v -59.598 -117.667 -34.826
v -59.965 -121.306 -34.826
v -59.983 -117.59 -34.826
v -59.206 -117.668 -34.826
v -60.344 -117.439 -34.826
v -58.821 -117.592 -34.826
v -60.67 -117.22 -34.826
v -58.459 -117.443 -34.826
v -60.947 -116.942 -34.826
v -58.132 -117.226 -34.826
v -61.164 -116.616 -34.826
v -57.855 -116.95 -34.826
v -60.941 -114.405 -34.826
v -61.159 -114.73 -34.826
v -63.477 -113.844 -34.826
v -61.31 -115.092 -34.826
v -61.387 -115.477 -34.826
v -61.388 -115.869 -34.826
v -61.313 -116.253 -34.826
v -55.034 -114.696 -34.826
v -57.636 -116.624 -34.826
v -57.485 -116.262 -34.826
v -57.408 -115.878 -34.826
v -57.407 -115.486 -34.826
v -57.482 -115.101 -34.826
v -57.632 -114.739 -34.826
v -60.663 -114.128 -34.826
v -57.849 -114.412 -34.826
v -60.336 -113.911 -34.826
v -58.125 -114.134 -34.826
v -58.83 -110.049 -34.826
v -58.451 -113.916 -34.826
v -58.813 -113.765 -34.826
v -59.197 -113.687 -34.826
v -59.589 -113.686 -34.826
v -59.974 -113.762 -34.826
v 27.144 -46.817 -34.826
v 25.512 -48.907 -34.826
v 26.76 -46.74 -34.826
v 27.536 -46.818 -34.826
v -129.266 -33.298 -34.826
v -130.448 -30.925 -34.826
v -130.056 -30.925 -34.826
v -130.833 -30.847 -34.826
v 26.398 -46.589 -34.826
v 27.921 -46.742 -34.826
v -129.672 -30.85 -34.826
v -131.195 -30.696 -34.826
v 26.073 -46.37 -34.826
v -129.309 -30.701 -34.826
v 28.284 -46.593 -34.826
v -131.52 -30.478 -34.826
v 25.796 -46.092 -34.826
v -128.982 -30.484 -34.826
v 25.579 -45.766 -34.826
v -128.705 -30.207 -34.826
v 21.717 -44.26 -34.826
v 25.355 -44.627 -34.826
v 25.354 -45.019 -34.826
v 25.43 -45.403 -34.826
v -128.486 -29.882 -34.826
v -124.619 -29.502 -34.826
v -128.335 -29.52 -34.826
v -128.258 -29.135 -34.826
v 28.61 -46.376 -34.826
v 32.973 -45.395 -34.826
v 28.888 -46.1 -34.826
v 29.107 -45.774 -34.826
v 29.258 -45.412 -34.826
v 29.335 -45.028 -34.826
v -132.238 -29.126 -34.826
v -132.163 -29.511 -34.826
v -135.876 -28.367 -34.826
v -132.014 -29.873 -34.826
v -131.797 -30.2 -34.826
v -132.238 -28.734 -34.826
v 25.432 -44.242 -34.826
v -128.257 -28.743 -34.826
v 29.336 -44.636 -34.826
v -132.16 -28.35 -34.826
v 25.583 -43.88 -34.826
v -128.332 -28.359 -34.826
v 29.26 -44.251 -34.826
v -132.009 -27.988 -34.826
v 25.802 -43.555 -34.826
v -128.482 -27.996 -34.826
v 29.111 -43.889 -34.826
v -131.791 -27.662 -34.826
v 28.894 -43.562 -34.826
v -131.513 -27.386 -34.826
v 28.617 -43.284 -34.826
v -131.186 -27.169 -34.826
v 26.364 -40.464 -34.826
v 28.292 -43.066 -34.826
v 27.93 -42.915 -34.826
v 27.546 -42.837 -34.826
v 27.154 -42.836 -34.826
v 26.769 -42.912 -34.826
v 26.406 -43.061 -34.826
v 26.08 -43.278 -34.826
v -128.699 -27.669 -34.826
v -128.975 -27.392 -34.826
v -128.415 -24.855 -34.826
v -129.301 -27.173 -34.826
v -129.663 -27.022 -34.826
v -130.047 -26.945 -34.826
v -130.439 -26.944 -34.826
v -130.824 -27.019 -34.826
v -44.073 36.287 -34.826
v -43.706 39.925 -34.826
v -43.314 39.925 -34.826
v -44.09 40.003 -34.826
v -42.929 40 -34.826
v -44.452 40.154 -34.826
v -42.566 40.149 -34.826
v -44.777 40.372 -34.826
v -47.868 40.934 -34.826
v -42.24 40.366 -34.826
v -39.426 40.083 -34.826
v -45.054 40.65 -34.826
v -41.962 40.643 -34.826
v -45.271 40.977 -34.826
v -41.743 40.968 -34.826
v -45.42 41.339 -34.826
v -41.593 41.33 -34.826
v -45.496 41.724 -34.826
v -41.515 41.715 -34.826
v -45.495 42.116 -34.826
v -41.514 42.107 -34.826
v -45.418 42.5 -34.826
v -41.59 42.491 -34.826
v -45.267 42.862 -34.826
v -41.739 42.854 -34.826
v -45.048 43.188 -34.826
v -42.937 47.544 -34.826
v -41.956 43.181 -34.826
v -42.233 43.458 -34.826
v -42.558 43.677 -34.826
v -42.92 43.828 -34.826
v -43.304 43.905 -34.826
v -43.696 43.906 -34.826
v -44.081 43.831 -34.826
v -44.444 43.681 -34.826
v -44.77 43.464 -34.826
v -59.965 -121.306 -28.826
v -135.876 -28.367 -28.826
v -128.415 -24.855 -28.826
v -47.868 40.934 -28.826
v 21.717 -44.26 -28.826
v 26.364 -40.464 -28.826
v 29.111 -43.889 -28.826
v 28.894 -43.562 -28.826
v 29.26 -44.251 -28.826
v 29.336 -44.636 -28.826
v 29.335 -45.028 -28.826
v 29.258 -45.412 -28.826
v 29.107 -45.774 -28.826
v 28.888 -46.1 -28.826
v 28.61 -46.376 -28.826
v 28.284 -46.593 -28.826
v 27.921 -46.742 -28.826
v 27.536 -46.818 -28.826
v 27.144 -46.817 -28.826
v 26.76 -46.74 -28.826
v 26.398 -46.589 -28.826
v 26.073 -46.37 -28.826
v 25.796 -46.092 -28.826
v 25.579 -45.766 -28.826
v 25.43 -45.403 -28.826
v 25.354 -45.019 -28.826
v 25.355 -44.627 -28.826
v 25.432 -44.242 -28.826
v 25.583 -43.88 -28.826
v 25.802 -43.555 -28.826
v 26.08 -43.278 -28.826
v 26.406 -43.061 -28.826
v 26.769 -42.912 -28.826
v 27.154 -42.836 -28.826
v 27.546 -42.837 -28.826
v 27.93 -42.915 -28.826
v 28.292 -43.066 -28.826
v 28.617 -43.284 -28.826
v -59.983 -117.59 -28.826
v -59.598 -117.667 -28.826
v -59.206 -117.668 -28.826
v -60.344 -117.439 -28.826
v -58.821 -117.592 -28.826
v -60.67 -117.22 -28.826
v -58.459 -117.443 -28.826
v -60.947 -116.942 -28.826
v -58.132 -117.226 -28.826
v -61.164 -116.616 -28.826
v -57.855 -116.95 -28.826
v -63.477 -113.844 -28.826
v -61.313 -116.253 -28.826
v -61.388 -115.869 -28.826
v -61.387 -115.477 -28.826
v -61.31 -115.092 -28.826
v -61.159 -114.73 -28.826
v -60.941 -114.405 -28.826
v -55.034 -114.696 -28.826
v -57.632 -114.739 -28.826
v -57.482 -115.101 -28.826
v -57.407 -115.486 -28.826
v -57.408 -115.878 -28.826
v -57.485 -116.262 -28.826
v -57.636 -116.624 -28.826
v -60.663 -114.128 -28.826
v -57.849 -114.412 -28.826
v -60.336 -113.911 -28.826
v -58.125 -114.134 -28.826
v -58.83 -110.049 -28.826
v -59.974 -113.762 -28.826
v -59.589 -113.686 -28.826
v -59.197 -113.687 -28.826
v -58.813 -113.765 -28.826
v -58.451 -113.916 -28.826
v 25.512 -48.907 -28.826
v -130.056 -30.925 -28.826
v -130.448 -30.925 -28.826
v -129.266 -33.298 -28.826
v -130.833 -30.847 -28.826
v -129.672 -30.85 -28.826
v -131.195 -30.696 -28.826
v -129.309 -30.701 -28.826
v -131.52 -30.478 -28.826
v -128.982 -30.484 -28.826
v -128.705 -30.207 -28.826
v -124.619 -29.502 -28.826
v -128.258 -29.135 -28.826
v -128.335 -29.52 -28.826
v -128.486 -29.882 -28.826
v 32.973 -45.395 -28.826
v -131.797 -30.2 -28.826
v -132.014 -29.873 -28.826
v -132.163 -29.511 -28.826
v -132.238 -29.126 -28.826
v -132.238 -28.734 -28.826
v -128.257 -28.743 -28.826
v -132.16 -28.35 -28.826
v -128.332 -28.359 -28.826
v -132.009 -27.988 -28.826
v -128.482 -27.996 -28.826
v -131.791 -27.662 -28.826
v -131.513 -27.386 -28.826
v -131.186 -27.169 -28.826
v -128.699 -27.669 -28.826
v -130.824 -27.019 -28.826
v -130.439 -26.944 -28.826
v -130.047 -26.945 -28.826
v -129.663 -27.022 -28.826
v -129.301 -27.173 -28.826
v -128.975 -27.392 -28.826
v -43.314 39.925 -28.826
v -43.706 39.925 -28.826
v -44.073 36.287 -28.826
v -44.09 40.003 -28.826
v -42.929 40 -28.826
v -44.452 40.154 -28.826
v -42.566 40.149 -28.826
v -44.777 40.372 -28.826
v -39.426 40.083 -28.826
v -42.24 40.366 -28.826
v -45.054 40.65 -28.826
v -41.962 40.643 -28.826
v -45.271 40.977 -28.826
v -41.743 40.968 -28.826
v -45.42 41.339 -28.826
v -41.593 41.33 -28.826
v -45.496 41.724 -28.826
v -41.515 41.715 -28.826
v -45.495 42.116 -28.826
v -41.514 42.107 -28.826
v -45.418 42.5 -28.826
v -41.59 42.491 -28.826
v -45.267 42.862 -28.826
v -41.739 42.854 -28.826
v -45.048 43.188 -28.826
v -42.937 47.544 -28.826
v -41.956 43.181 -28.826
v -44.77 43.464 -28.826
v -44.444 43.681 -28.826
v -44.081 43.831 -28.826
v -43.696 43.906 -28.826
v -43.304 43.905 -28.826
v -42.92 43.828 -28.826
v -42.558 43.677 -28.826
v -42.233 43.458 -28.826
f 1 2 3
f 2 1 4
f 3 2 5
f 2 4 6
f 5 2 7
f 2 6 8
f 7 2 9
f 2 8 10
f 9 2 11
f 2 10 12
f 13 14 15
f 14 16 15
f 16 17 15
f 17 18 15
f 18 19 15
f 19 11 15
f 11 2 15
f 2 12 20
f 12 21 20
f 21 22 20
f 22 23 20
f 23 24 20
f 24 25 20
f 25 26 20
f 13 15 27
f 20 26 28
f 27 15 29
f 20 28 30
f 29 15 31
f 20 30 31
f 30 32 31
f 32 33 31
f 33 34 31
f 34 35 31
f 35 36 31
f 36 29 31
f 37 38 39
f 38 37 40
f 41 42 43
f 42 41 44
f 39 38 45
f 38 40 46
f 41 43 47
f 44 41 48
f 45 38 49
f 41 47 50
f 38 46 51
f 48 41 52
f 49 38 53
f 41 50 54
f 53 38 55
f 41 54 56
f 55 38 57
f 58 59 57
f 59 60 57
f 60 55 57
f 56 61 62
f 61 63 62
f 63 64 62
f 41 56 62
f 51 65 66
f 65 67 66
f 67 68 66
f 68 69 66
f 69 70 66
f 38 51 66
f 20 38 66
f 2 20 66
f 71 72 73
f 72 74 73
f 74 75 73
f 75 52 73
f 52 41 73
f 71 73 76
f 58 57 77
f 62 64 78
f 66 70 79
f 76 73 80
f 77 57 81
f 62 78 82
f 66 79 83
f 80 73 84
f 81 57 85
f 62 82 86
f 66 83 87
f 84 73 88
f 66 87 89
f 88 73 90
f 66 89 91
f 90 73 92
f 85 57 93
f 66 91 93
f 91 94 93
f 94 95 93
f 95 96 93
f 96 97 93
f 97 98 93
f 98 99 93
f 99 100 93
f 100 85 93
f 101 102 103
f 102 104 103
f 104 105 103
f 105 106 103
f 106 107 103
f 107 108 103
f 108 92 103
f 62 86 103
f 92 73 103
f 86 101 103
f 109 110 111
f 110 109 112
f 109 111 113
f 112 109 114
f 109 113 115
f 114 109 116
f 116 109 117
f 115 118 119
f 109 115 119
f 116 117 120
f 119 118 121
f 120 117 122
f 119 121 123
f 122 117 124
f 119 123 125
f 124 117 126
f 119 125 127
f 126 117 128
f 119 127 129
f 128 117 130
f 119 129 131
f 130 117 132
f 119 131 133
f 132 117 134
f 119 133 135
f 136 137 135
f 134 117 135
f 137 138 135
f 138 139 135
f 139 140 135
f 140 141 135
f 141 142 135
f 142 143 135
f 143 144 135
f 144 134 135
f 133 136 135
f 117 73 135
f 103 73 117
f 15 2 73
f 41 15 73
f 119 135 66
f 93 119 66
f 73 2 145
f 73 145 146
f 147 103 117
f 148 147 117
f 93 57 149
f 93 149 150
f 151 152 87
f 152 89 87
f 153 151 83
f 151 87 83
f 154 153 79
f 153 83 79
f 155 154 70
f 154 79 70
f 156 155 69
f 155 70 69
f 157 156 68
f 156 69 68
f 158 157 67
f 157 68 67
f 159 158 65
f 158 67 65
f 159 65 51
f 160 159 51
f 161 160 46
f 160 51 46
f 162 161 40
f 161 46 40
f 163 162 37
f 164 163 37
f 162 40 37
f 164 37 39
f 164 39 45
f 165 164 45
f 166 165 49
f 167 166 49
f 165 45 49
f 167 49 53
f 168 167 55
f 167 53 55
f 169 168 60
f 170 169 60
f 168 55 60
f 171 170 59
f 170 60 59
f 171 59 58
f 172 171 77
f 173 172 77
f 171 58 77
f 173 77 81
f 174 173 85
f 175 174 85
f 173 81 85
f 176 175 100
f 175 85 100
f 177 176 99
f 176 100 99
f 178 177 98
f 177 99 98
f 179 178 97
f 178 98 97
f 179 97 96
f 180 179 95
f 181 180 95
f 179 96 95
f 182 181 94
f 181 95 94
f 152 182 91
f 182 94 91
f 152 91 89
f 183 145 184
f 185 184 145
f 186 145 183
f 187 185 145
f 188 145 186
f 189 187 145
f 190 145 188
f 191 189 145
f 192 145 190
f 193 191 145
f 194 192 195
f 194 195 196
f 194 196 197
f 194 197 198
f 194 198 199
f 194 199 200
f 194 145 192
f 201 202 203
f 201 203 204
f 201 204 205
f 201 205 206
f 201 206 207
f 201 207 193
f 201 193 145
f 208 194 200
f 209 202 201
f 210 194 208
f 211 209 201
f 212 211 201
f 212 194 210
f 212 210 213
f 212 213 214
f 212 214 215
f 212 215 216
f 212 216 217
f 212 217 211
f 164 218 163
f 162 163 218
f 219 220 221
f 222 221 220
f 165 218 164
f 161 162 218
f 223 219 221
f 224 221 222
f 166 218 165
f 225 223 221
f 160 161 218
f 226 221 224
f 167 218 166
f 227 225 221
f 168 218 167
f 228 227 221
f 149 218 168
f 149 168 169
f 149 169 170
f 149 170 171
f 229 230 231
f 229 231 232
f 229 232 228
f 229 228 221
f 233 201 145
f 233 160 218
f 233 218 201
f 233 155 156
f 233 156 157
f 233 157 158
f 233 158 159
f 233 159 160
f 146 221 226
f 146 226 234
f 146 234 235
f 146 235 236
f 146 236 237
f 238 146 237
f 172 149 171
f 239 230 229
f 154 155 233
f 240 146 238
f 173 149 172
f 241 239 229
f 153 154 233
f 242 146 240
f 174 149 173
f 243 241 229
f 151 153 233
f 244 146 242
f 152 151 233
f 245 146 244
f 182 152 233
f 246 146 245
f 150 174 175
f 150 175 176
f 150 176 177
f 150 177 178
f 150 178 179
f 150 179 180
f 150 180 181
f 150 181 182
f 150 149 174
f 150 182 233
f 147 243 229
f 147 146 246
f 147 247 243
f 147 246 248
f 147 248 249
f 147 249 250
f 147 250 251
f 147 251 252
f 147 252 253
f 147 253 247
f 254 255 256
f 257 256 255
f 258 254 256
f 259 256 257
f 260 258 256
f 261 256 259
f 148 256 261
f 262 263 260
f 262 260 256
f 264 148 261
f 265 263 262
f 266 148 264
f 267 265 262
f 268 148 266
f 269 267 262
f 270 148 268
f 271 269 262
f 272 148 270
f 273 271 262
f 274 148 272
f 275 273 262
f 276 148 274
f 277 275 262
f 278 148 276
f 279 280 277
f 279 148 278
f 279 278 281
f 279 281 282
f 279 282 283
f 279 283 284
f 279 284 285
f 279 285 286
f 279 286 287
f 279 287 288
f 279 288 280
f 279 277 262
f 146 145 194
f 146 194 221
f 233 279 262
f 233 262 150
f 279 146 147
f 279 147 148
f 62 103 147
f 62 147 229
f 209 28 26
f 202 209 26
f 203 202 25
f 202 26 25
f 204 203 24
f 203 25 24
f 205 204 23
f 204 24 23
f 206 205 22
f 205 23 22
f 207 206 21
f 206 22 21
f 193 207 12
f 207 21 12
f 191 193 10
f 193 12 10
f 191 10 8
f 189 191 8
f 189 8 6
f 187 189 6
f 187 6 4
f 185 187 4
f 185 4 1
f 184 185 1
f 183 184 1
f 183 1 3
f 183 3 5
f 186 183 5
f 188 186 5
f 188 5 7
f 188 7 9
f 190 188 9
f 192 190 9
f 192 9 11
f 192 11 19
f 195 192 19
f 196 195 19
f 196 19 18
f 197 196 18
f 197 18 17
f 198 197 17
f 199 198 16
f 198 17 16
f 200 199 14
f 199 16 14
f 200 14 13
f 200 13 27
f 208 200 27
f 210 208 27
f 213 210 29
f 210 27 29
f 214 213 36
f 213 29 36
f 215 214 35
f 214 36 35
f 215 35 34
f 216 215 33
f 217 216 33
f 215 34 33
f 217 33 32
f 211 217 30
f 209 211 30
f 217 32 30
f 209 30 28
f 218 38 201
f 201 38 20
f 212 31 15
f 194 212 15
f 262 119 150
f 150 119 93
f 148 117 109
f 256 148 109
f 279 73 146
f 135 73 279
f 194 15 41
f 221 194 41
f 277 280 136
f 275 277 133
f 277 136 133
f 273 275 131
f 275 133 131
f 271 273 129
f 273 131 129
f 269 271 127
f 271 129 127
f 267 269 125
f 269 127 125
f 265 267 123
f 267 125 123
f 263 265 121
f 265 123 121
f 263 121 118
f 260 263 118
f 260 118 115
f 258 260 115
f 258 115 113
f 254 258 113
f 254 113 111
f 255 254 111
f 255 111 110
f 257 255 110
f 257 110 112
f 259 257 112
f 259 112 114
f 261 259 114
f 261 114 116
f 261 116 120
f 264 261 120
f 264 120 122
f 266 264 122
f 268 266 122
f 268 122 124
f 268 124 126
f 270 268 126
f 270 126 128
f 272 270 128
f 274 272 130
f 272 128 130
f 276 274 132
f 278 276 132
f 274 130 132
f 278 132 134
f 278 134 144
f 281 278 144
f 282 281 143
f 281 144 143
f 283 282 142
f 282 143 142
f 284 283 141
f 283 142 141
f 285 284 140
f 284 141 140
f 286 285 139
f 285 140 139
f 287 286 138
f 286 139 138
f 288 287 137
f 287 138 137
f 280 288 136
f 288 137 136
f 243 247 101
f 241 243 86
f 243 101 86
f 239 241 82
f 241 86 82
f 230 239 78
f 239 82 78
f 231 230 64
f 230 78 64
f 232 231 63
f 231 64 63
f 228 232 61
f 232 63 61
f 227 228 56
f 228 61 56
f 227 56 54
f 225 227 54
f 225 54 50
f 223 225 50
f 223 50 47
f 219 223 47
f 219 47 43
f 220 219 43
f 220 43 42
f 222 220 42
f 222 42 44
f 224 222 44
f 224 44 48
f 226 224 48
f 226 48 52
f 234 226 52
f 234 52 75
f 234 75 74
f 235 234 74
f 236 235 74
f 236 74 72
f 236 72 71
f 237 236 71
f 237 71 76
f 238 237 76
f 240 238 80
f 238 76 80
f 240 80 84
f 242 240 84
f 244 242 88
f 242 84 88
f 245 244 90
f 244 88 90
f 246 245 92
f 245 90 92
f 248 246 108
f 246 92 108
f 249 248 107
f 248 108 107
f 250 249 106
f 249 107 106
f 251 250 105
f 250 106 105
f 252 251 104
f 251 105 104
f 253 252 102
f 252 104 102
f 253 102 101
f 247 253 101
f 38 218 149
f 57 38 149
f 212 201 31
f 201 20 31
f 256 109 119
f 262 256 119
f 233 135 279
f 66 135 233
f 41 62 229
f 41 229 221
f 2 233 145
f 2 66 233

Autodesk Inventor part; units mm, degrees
ref_plane "YZ Plane" through (0, 0, 0) normal (1, 0, 0) x (0, 1, 0)
ref_plane "XZ Plane" through (0, 0, 0) normal (0, 1, 0) x (-1, 0, 0)
ref_plane "XY Plane" through (0, 0, 0) normal (0, 0, 1) x (1, 0, 0)
ref_plane "Work Plane1" through (-43.297, -16.1171, -34.8261) normal (0, 0, 1) x (0.7745, 0.6326, 0)
sketch "Sketch1" plane through (-43.297, -16.1171, -34.8261) normal (0, 0, 1) x (0.7745, 0.6326, 0)
  line L0 (-79.4504, 49.077) -> (40.5496, 49.077)
  line L1 (40.5496, 49.077) -> (40.5496, -70.923)
  line L2 (40.5496, -70.923) -> (-79.4504, -70.923)
  line L3 (-79.4504, -70.923) -> (-79.4504, 49.077)
  line L4 (-77.4504, 47.077) -> (38.5496, 47.077)
  line L5 (38.5496, 47.077) -> (38.5496, -68.923)
  line L6 (38.5496, -68.923) -> (-77.4504, -68.923)
  line L7 (-77.4504, -68.923) -> (-77.4504, 47.077)
  line L8 (-79.4504, 49.077) -> (-71.4504, 49.077)
  line L9 (-71.4504, 49.077) -> (-71.4504, 41.077)
  line L10 (-71.4504, 41.077) -> (-79.4504, 41.077)
  line L11 (-79.4504, 41.077) -> (-79.4504, 49.077)
  line L12 (40.5496, 49.077) -> (32.5496, 49.077)
  line L13 (32.5496, 49.077) -> (32.5496, 41.077)
  line L14 (32.5496, 41.077) -> (40.5496, 41.077)
  line L15 (40.5496, 41.077) -> (40.5496, 49.077)
  line L16 (-79.4504, -70.923) -> (-71.4504, -70.923)
  line L17 (-71.4504, -70.923) -> (-71.4504, -62.923)
  line L18 (-71.4504, -62.923) -> (-79.4504, -62.923)
  line L19 (-79.4504, -62.923) -> (-79.4504, -70.923)
  line L20 (40.5496, -70.923) -> (32.5496, -70.923)
  line L21 (32.5496, -70.923) -> (32.5496, -62.923)
  line L22 (32.5496, -62.923) -> (40.5496, -62.923)
  line L23 (40.5496, -62.923) -> (40.5496, -70.923)
  circle A0 centre (-75.4504, 45.077) radius 2
  circle A1 centre (36.5496, 45.077) radius 2
  circle A2 centre (-75.4504, -66.923) radius 2
  circle A3 centre (36.5496, -66.923) radius 2
  point P0 (43.7284, -14.9068)
  point P1 (-71.4504, 47.077)
  point P2 (32.5496, 47.077)
  point P3 (38.5496, 41.077)
  point P4 (38.5496, -62.923)
  point P5 (32.5496, -68.923)
  point P6 (-71.4504, -68.923)
  point P7 (-77.4504, -62.923)
  point P8 (-77.4504, 41.077)
  dimension "d0" = 2
  dimension "d1" = 120
  dimension "d2" = 120
  dimension "d3" = 8
  dimension "d4" = 8
  dimension "d5" = 8
  dimension "d6" = 8
  dimension "d7" = 8
  dimension "d8" = 8
  dimension "d9" = 8
  dimension "d10" = 8
  dimension "d11" = 4
  dimension "d12" = 4
  dimension "d13" = 4
  dimension "d14" = 4
  dimension "d15" = 4
  dimension "d16" = 4
  dimension "d17" = 4
  dimension "d18" = 4
  dimension "d19" = 4
  dimension "d20" = 4
  dimension "d21" = 4
  dimension "d22" = 4
extrude "Extrusion1" add sketch "Sketch1" along normal blind 6 contours L0 L9 L4 L7 L10 L3 | L0 L13 L4 L9 | L10 L7 L18 L3 | L0 L1 L14 L5 L4 L13 | L9 L10 L7 A0 L4 | L18 L7 L6 L17 L2 L3 | L4 A1 L5 L14 L13 | A0 L7 L4 | L18 L17 L6 A2 L7 | L1 L22 L5 L14 | L4 L5 A1 | L17 L6 L21 L2 | A2 L6 L7 | L1 L2 L21 L6 L5 L22 | L5 A3 L6 L21 L22 | L5 L6 A3
equation "\"d2\" = d1"
equation "\"d3\" = d6"
equation "\"d4\" = d6"
equation "\"d5\" = d6"
equation "\"d7\" = d6"
equation "\"d8\" = d6"
equation "\"d9\" = d6"
equation "\"d10\" = d6"
equation "\"d15\" = d18"
equation "\"d16\" = d17"
equation "\"d18\" = d17"
equation "\"d19\" = d17"
equation "\"d20\" = d17"
equation "\"d21\" = d17"
equation "\"d22\" = d17"
properties part number "Stage_shunt"
